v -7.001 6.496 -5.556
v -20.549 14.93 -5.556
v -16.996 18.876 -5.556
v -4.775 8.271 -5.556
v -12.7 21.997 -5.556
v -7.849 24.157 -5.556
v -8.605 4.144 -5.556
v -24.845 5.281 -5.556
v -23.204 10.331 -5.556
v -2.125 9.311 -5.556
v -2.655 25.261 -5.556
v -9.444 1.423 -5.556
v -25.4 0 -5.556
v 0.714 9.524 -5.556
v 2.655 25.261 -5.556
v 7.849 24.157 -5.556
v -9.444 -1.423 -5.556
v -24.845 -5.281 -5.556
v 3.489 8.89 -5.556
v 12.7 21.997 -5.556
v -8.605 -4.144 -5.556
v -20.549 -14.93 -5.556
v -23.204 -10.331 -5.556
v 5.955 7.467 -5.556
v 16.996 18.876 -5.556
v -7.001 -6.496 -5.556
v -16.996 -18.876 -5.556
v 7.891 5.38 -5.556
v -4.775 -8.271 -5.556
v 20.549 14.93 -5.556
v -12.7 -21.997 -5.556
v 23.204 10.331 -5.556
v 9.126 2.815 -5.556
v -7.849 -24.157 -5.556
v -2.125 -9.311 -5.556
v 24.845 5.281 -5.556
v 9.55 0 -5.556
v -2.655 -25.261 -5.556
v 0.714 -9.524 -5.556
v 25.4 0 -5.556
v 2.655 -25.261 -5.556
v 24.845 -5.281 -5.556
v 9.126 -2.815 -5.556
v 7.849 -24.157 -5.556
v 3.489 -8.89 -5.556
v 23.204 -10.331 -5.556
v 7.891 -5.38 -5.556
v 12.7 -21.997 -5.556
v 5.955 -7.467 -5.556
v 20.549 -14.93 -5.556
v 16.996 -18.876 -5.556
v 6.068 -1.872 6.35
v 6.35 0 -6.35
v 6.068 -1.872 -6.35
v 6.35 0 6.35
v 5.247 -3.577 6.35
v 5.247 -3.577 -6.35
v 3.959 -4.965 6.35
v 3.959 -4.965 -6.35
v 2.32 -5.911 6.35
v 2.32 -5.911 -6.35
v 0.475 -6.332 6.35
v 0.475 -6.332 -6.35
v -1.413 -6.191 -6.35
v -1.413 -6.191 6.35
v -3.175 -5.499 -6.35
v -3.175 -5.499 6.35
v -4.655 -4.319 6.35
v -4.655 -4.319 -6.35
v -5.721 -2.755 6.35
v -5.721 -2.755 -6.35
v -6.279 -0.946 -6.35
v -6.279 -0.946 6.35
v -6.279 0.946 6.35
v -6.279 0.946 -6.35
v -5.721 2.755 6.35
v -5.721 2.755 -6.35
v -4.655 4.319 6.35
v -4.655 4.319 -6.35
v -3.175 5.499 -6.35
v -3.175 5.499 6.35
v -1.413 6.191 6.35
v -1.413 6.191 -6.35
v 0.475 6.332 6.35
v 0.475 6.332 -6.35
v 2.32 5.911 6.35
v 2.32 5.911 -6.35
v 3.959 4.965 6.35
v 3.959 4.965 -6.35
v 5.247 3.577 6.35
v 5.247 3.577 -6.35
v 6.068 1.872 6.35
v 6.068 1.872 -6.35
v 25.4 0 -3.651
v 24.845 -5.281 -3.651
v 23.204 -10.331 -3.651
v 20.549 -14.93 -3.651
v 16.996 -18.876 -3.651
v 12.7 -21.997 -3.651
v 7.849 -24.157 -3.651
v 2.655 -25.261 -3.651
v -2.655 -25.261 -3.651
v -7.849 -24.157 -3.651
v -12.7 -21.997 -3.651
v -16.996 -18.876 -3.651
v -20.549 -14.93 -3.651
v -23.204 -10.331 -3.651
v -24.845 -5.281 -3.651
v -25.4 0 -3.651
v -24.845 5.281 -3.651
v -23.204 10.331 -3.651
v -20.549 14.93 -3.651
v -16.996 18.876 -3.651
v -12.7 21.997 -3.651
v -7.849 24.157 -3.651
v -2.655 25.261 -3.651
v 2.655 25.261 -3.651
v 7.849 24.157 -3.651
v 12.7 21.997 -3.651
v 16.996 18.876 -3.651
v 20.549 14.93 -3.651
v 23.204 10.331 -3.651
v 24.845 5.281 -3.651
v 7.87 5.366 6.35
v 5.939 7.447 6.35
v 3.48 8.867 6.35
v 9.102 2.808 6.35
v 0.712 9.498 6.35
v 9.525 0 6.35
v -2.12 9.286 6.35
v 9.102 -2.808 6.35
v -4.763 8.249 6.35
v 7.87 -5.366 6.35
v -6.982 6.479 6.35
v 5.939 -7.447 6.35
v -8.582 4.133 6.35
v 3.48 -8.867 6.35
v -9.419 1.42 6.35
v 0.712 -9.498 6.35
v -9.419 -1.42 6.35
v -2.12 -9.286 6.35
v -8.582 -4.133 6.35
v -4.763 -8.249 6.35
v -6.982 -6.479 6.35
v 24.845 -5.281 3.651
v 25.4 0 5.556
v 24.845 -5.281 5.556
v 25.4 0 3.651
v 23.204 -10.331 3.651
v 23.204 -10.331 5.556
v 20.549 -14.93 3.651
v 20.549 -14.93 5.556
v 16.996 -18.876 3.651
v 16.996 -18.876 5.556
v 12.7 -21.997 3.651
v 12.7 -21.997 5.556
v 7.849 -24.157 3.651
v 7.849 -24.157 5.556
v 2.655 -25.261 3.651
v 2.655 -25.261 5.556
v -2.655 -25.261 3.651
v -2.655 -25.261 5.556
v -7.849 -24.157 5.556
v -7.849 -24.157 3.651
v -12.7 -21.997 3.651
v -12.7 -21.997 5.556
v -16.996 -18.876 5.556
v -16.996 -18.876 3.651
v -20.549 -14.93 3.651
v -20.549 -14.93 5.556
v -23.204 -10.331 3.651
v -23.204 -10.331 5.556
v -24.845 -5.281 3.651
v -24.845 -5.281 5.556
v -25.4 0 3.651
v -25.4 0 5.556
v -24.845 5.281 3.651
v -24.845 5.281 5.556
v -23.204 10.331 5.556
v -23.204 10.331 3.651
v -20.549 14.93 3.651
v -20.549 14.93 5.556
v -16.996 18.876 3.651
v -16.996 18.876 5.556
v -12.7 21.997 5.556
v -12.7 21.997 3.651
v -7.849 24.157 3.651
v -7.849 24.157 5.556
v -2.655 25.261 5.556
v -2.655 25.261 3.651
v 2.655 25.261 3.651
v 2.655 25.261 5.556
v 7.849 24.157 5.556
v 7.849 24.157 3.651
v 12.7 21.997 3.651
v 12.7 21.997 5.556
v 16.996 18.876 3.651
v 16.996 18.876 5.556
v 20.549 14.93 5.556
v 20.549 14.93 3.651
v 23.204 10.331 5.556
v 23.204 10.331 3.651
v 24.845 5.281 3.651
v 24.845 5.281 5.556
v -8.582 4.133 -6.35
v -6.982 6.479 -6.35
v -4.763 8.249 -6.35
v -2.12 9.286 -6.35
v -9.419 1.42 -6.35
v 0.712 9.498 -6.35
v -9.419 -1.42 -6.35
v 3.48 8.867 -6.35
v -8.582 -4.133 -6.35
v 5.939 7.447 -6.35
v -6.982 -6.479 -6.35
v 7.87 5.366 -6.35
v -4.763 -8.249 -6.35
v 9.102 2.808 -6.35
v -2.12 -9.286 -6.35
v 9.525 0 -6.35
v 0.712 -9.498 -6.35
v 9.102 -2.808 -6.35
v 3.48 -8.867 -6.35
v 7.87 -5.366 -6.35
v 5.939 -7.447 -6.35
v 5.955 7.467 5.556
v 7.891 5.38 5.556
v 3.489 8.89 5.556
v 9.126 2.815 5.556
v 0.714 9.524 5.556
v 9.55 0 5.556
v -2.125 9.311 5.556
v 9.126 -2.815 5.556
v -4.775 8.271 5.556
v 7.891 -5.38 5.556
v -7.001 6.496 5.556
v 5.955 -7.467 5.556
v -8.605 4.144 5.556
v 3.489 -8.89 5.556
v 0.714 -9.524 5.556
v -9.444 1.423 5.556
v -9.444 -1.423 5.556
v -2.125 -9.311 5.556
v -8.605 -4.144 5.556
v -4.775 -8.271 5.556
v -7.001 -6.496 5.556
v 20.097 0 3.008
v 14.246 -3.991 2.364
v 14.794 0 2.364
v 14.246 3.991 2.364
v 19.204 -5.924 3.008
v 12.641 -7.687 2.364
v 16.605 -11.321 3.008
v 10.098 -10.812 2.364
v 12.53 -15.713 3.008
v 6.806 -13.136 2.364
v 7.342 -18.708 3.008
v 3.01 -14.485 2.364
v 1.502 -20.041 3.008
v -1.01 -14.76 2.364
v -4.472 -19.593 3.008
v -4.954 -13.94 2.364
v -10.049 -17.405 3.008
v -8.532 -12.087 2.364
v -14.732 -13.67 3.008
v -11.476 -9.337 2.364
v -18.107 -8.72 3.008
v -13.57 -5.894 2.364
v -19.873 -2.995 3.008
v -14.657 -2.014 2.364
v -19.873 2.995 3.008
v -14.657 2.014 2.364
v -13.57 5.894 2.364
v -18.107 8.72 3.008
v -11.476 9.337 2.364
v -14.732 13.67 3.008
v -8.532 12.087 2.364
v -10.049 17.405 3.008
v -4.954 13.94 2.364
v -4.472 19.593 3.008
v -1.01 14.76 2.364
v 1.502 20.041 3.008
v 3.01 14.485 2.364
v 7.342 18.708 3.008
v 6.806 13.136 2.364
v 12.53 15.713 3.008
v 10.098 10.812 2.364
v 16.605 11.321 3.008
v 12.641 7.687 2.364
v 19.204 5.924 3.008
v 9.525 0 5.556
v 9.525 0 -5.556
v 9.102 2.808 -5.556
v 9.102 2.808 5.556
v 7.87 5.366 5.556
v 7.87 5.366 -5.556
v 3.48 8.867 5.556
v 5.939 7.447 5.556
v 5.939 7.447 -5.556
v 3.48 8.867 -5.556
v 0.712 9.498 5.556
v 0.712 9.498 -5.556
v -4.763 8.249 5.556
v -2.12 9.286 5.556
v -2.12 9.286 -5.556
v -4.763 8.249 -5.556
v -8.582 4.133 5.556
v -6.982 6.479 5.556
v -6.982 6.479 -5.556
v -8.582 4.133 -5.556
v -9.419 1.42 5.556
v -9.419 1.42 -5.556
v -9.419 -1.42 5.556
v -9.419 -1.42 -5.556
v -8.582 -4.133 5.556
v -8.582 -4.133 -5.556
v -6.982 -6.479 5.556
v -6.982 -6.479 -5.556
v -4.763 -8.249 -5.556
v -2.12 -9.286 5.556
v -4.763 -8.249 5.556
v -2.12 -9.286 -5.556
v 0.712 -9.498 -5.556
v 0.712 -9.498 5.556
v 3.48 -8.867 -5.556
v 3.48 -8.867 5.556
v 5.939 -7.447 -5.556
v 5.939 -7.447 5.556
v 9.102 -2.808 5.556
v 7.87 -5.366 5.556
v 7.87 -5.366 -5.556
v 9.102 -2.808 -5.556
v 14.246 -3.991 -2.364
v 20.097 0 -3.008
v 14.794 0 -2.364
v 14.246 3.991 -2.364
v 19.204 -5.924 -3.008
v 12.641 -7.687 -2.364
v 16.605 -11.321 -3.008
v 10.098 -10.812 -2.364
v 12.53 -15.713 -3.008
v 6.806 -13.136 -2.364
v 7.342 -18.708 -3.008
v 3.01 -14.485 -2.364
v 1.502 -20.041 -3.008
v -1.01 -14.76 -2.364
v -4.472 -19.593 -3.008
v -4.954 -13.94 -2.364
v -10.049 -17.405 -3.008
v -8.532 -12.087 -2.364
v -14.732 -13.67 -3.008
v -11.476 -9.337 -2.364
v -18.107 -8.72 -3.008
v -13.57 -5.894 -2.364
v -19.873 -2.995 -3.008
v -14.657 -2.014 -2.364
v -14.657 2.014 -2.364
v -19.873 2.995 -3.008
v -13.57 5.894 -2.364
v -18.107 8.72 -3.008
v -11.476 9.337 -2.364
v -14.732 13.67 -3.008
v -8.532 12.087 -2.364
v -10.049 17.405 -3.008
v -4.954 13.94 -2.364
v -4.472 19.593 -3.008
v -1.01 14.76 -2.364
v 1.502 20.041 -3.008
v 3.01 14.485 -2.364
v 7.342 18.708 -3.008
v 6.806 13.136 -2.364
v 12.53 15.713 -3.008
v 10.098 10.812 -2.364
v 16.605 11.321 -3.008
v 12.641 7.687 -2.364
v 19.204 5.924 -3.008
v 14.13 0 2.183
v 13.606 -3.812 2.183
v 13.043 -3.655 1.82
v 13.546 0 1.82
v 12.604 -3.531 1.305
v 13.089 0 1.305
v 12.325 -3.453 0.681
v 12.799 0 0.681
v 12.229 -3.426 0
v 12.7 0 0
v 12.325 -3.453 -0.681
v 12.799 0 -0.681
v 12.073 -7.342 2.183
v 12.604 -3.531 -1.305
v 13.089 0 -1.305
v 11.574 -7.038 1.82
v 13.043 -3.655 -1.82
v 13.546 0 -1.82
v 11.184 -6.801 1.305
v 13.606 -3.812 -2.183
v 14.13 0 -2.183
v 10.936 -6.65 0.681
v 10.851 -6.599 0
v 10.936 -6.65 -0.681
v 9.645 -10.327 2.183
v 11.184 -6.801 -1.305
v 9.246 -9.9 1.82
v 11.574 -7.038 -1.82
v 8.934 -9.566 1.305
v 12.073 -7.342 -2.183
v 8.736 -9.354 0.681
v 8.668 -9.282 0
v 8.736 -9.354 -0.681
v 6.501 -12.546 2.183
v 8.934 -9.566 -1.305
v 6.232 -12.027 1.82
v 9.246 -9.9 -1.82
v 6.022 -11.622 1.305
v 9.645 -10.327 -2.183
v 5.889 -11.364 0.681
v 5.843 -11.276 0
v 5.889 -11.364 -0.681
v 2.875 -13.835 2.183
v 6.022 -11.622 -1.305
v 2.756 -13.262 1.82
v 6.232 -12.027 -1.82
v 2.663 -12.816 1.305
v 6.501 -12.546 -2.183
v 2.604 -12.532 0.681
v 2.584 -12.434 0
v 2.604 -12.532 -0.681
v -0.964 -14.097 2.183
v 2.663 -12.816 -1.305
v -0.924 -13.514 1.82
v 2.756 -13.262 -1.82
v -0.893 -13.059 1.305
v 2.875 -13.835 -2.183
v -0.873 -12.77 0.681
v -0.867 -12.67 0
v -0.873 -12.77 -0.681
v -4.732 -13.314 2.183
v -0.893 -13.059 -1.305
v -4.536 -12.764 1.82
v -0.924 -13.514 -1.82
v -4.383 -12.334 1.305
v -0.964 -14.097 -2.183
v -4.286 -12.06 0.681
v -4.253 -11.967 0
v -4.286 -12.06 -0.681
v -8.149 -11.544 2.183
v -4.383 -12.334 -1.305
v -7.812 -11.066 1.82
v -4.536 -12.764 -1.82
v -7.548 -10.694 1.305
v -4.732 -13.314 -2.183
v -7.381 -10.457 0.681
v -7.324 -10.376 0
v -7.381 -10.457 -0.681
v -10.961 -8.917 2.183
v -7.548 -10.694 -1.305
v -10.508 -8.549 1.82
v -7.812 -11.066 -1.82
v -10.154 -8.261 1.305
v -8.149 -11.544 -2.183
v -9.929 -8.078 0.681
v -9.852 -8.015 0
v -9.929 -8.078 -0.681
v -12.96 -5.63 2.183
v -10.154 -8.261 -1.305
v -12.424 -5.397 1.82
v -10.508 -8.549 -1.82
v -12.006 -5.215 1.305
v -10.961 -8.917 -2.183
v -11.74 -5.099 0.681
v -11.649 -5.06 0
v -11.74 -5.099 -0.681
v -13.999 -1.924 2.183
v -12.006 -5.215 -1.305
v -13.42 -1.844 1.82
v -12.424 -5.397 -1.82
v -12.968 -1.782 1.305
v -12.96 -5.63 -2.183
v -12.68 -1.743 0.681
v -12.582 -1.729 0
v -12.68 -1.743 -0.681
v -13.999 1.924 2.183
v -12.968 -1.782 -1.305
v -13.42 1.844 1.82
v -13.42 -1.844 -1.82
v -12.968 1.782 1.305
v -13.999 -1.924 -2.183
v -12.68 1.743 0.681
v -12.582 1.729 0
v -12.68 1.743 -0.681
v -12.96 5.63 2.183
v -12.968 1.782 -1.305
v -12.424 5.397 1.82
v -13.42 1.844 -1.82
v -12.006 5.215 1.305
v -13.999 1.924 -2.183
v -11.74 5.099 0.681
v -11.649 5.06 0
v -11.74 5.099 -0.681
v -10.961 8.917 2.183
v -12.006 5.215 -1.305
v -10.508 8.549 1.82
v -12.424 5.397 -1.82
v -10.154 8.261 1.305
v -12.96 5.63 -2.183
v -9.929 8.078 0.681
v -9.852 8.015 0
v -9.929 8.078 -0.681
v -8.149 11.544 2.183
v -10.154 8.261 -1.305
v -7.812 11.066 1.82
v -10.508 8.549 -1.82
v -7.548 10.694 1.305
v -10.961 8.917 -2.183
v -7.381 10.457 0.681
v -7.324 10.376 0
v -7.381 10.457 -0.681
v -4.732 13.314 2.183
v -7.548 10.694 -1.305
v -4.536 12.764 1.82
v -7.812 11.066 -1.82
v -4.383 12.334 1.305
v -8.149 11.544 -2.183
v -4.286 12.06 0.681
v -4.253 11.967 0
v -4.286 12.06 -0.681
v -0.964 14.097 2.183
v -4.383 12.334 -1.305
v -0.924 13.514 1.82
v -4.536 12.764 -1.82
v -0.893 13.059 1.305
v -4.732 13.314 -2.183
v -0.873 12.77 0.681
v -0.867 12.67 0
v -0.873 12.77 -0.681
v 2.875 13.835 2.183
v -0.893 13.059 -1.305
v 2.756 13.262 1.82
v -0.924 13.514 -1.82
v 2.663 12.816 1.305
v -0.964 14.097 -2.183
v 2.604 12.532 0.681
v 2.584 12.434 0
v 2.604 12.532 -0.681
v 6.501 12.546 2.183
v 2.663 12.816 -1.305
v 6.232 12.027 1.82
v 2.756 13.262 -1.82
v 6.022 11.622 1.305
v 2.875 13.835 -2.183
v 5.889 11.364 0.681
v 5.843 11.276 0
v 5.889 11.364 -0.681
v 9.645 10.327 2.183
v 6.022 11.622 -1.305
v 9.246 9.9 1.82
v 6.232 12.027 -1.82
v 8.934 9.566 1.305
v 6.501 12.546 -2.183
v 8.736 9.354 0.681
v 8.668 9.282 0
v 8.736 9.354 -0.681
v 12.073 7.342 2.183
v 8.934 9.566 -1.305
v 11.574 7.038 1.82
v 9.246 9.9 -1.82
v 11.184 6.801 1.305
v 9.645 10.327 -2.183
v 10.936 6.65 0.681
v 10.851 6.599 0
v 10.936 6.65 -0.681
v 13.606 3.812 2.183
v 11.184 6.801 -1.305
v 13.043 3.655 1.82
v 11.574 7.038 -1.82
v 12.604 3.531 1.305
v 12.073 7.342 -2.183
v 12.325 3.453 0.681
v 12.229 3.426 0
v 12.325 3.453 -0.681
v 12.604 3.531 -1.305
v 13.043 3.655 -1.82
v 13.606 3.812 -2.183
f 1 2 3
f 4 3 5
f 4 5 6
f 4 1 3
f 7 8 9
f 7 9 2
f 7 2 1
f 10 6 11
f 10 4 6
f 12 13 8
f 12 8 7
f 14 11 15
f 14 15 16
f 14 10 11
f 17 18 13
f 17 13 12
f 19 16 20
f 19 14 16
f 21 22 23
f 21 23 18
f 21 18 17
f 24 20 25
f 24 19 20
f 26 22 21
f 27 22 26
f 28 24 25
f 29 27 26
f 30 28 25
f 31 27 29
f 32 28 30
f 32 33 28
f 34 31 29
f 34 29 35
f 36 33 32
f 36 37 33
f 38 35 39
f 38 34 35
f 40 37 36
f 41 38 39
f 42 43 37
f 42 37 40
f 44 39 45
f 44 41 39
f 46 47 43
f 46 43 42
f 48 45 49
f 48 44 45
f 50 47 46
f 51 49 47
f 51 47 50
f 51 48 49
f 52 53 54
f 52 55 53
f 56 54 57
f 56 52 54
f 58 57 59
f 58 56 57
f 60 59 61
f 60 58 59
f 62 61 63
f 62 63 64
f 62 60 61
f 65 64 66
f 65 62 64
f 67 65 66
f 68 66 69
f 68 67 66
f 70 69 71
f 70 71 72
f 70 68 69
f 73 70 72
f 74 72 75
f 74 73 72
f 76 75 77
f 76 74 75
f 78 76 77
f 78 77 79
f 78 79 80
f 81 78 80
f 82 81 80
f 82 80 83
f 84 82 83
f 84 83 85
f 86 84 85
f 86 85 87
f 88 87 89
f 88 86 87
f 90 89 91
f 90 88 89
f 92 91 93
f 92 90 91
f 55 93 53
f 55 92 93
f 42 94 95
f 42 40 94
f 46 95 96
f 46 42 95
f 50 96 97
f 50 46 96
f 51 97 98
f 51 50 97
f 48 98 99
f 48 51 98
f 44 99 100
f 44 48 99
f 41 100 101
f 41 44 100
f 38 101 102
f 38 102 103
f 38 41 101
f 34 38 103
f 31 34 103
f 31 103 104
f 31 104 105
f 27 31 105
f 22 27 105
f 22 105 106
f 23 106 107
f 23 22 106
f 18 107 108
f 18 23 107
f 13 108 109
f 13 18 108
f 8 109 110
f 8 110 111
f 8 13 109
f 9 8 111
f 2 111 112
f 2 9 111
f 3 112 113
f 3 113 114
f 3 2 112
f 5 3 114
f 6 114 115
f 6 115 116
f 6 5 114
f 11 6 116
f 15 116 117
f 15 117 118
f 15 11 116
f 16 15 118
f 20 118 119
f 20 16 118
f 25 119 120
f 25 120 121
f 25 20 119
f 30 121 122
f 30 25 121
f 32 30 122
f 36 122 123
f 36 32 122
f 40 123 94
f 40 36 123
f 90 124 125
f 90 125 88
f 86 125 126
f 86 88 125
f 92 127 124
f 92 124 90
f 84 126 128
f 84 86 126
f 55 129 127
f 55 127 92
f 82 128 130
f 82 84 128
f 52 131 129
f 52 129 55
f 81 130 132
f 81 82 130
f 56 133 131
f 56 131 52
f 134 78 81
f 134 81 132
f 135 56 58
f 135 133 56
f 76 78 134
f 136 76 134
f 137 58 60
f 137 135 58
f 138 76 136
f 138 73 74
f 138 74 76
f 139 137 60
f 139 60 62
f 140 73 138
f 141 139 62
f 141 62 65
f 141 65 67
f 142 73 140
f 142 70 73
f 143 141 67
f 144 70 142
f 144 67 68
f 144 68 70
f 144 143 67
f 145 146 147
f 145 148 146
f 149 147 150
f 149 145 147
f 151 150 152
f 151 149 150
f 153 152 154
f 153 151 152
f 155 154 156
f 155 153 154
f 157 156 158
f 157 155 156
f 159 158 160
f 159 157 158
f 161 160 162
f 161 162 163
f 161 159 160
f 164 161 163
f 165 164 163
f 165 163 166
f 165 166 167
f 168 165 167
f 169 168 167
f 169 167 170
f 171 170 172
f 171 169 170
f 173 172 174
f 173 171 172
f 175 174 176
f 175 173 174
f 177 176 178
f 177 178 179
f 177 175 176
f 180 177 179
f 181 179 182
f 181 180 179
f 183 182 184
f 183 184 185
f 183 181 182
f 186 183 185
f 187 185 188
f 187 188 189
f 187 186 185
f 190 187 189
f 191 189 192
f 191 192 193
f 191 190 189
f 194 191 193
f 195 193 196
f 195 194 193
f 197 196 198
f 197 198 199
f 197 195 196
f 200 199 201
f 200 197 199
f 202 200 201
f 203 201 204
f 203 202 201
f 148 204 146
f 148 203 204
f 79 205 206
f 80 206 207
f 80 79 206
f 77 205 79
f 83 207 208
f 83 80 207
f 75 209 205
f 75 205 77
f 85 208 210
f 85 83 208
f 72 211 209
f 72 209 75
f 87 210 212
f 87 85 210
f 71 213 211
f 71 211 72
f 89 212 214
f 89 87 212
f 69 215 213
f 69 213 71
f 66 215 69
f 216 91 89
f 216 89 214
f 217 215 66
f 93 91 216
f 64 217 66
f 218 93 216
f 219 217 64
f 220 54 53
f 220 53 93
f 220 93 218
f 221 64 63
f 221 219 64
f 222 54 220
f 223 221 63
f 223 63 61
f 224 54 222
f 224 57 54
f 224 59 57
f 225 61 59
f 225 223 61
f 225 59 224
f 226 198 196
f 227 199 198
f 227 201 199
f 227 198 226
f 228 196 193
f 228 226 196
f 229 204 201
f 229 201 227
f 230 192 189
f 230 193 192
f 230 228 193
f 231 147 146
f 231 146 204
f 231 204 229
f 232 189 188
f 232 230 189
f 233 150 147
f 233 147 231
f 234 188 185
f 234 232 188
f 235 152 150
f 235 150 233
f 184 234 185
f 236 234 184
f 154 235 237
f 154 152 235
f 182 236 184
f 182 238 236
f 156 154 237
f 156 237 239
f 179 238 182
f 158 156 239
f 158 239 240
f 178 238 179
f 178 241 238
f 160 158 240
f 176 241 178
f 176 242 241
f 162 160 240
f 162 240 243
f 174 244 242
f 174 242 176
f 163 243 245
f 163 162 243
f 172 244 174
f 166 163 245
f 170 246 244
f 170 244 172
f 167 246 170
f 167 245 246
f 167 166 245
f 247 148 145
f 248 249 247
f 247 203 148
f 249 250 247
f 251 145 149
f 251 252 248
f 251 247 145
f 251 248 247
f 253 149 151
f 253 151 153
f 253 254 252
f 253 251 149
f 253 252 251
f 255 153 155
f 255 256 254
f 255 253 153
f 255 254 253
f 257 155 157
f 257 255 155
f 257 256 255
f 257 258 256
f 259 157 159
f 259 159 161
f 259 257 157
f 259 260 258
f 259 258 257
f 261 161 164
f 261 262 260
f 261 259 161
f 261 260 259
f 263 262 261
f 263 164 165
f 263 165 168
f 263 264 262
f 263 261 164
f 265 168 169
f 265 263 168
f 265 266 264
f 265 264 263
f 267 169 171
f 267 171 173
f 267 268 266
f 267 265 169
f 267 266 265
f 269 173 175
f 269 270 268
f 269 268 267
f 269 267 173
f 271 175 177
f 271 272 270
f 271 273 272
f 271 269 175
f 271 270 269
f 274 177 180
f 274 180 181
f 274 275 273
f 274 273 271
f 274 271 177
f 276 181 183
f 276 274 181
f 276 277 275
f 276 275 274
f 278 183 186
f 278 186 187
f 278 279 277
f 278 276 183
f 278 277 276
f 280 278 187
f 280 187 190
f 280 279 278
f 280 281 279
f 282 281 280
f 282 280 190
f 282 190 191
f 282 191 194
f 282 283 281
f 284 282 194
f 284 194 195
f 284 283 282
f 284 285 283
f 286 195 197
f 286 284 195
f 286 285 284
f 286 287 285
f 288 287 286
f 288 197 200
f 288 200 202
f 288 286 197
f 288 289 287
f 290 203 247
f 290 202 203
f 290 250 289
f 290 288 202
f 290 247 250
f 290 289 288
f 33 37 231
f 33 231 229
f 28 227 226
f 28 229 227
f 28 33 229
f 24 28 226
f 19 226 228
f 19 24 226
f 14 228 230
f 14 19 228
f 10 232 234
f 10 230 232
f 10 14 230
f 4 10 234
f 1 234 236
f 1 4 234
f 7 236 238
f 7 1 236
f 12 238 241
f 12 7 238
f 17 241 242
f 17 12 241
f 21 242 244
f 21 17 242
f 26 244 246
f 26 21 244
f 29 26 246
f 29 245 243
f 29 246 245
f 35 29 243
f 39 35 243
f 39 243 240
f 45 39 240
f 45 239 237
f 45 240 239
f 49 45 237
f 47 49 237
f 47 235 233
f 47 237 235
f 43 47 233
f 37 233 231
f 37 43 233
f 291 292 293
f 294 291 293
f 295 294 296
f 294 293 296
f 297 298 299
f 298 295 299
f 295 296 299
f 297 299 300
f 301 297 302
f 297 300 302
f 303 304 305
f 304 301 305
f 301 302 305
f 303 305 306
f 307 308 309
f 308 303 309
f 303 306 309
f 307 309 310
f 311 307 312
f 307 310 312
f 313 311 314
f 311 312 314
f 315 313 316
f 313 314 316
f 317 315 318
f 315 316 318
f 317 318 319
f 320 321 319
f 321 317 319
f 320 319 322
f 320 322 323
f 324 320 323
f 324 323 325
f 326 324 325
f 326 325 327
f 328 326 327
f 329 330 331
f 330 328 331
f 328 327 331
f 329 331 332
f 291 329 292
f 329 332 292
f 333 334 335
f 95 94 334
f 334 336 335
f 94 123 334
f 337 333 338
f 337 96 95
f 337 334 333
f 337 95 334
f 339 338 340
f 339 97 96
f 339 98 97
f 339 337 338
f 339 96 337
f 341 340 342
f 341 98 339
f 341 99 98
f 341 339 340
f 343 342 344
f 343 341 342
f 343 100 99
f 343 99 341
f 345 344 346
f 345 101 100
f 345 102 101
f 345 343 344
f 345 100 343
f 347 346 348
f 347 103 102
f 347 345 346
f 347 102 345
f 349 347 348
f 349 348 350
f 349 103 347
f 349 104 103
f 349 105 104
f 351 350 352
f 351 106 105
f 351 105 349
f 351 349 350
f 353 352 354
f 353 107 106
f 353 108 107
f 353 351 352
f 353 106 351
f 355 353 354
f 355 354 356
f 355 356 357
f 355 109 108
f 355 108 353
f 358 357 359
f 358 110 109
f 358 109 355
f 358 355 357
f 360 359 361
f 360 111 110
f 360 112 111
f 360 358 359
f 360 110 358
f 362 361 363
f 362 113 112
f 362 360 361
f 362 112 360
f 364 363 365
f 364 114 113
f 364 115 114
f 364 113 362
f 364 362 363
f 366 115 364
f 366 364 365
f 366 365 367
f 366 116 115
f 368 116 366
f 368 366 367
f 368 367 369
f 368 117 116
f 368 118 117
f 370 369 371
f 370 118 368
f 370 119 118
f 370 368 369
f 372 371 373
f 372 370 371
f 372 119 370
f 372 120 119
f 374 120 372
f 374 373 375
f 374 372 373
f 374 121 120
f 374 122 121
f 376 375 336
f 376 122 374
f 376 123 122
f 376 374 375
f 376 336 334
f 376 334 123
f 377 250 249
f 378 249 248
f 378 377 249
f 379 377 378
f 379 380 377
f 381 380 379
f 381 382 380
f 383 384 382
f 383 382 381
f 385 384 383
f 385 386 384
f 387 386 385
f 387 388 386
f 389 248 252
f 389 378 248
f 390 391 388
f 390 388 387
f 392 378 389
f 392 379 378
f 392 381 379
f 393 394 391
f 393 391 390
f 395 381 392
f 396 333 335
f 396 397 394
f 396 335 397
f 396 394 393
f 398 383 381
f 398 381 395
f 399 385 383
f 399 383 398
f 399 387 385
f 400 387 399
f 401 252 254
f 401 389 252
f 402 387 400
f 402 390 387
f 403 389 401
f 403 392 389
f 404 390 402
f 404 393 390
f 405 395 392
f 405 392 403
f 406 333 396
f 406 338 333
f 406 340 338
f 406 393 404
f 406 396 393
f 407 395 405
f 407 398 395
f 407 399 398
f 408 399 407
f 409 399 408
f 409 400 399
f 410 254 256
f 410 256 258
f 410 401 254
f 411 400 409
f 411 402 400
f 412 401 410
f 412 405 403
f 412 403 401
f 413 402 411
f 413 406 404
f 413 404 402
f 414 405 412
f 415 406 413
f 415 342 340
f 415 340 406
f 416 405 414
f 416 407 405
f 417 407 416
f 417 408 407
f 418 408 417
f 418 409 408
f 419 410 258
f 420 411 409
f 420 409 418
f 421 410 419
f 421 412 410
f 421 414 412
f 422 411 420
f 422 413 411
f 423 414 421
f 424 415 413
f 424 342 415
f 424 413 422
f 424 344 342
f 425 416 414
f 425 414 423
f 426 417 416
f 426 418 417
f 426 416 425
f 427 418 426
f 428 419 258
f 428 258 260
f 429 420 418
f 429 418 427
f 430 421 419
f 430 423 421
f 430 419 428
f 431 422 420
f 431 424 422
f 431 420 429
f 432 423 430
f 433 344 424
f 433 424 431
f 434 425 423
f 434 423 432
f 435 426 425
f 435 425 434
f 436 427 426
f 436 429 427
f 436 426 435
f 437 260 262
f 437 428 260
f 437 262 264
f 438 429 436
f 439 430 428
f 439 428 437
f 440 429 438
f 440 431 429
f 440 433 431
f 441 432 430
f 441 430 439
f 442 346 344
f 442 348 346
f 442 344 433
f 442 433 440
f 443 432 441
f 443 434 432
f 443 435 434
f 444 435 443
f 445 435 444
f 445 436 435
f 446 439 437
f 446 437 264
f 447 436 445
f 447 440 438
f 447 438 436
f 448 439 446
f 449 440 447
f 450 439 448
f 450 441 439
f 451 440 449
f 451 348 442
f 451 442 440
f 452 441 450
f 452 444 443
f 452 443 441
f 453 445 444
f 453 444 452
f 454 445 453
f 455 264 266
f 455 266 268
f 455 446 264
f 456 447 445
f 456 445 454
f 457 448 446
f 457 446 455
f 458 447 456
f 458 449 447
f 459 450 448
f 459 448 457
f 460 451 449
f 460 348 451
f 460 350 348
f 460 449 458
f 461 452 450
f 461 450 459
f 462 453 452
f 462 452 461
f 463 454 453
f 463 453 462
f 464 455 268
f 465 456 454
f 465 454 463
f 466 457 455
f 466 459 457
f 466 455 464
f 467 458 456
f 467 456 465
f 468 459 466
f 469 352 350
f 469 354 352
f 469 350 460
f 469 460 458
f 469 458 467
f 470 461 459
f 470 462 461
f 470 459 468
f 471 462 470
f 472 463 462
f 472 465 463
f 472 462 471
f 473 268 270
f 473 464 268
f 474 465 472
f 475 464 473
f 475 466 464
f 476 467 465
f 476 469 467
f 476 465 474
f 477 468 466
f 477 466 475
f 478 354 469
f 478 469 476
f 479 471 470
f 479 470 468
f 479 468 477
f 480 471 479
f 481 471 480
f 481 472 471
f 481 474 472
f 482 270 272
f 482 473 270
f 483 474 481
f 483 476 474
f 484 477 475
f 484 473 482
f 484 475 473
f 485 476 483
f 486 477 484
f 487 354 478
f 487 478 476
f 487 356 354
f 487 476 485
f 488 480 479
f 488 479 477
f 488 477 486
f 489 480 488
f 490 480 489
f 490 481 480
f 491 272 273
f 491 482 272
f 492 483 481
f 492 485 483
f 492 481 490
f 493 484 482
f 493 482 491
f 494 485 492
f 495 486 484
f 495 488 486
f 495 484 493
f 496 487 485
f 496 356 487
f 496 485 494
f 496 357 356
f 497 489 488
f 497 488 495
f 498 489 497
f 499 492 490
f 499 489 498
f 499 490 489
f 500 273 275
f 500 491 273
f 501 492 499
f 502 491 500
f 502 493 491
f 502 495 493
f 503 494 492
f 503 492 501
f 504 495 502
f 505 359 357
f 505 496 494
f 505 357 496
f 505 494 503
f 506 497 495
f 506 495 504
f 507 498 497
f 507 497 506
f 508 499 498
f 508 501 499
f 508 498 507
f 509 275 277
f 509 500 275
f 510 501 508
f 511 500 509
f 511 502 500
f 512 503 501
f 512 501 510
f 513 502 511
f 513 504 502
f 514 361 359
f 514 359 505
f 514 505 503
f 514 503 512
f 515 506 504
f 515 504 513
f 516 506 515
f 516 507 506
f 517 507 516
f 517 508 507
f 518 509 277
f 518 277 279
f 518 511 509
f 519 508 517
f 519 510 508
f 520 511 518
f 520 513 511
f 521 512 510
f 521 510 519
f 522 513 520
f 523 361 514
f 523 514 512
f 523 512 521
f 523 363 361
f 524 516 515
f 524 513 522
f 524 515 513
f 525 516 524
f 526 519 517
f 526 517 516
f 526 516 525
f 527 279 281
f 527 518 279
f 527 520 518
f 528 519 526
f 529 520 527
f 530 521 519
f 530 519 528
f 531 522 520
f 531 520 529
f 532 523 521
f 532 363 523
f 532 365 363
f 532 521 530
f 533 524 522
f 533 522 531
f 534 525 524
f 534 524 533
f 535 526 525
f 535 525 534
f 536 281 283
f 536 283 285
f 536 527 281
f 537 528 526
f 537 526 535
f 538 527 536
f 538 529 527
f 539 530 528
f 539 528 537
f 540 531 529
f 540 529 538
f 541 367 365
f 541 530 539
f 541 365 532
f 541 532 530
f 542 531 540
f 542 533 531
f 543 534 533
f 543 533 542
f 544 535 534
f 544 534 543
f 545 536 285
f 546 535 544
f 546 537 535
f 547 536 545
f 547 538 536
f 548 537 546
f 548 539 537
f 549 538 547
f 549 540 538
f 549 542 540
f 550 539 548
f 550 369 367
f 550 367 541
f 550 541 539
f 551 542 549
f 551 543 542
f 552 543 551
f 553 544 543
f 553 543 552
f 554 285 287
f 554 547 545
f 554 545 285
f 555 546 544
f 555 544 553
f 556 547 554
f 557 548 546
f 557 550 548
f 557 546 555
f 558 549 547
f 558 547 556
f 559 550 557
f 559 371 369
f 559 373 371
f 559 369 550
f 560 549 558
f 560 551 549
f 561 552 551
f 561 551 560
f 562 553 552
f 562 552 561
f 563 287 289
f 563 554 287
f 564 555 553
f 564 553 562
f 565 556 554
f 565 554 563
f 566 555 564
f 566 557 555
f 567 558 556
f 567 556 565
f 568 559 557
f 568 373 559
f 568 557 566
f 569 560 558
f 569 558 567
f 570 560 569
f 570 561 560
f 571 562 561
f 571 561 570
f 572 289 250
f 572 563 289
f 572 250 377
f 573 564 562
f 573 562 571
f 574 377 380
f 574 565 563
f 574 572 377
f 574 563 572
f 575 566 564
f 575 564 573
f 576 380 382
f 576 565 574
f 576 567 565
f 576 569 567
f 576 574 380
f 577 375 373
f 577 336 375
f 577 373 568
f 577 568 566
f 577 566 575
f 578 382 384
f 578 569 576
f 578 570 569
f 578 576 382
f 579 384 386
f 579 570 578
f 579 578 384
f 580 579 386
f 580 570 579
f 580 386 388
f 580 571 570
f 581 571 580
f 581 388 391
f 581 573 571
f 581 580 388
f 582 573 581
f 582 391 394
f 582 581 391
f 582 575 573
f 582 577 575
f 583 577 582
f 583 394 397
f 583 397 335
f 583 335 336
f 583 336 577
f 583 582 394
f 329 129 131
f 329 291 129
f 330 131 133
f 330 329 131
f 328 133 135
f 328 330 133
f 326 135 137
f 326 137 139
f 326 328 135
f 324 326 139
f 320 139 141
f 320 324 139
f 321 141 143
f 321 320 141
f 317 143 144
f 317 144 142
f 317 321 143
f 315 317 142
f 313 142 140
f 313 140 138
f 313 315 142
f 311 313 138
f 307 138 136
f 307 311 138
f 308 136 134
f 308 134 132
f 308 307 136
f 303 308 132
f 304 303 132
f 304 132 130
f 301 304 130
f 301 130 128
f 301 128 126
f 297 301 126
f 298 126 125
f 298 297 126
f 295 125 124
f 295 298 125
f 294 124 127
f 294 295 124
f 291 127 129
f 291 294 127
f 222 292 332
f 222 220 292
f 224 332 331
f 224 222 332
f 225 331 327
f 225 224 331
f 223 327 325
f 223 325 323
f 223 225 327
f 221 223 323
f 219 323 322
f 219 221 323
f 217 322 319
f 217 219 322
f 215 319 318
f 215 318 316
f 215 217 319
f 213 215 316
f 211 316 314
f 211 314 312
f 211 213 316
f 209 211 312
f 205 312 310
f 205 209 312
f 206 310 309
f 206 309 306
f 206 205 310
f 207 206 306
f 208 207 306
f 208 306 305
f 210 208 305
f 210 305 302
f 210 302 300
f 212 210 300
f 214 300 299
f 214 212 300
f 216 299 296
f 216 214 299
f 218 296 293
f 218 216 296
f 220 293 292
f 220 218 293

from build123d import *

# Parameters (mm, degrees)
CUT_EXTRUDE_THIN1_DEPTH      = 37.477972806
CUT_EXTRUDE_THIN1_DEPTH_BACK = 37.477972806
SKETCH2_R                    = 9.5504
SKETCH2_R_2                  = 9.525


with BuildPart() as part:
    # Sketch1 → Revolve1 (revolve)
    with BuildSketch(Plane(origin=(0, 0, 0), x_dir=(0, 0, -1), z_dir=(1, 0, 0)), mode=Mode.PRIVATE) as revolve1_sk:
        with BuildLine():
            Line((3.65125, 25.4), (5.55625, 25.4))
            Line((5.55625, 25.4), (5.55625, 9.525))
            Line((5.55625, 9.525), (6.35, 9.525))
            Line((6.35, 9.525), (6.35, 6.35))
            Line((6.35, 6.35), (-6.35, 6.35))
            Line((-6.35, 6.35), (-6.35, 9.525))
            Line((-6.35, 9.525), (-5.55625, 9.525))
            Line((-5.55625, 9.525), (-5.55625, 25.4))
            Line((-5.55625, 25.4), (-3.65125, 25.4))
            Line((-3.65125, 25.4), (-2.363899009, 14.794312658))
            ThreePointArc((-2.363899009, 14.794312658), (0, 12.7), (2.363899009, 14.794312658))
            Line((2.363899009, 14.794312658), (3.65125, 25.4))
        make_face()
    revolve(revolve1_sk.sketch.rotate(Axis((0, 0, 6.35), (0, 0, -1)), 90), axis=Axis((0, 0, 6.35), (0, 0, -1)))

    # Sketch2 → Cut-Extrude-Thin1 (cut, two sides: drawn at the far end of the back side and taken through both)
    with BuildSketch(Plane.XY.offset(-CUT_EXTRUDE_THIN1_DEPTH_BACK)):
        Circle(SKETCH2_R)
        Circle(SKETCH2_R_2, mode=Mode.SUBTRACT)
    extrude(amount=CUT_EXTRUDE_THIN1_DEPTH + CUT_EXTRUDE_THIN1_DEPTH_BACK, mode=Mode.SUBTRACT)


with BuildPart() as cut_extrude_thin1_piece_1:
    # of the separate pieces the step leaves, piece 1, a body of its own (cut_extrude_thin1_pieces)
    add(part.part.solids().sort_by_distance((25.4, 0, -3.65125))[0])


with BuildPart() as cut_extrude_thin1_piece_2:
    # of the separate pieces the step leaves, piece 2, a body of its own (cut_extrude_thin1_pieces)
    add(part.part.solids().sort_by_distance((9.525, 0, -5.55625))[0])


solid = Compound([cut_extrude_thin1_piece_1.part, cut_extrude_thin1_piece_2.part])
